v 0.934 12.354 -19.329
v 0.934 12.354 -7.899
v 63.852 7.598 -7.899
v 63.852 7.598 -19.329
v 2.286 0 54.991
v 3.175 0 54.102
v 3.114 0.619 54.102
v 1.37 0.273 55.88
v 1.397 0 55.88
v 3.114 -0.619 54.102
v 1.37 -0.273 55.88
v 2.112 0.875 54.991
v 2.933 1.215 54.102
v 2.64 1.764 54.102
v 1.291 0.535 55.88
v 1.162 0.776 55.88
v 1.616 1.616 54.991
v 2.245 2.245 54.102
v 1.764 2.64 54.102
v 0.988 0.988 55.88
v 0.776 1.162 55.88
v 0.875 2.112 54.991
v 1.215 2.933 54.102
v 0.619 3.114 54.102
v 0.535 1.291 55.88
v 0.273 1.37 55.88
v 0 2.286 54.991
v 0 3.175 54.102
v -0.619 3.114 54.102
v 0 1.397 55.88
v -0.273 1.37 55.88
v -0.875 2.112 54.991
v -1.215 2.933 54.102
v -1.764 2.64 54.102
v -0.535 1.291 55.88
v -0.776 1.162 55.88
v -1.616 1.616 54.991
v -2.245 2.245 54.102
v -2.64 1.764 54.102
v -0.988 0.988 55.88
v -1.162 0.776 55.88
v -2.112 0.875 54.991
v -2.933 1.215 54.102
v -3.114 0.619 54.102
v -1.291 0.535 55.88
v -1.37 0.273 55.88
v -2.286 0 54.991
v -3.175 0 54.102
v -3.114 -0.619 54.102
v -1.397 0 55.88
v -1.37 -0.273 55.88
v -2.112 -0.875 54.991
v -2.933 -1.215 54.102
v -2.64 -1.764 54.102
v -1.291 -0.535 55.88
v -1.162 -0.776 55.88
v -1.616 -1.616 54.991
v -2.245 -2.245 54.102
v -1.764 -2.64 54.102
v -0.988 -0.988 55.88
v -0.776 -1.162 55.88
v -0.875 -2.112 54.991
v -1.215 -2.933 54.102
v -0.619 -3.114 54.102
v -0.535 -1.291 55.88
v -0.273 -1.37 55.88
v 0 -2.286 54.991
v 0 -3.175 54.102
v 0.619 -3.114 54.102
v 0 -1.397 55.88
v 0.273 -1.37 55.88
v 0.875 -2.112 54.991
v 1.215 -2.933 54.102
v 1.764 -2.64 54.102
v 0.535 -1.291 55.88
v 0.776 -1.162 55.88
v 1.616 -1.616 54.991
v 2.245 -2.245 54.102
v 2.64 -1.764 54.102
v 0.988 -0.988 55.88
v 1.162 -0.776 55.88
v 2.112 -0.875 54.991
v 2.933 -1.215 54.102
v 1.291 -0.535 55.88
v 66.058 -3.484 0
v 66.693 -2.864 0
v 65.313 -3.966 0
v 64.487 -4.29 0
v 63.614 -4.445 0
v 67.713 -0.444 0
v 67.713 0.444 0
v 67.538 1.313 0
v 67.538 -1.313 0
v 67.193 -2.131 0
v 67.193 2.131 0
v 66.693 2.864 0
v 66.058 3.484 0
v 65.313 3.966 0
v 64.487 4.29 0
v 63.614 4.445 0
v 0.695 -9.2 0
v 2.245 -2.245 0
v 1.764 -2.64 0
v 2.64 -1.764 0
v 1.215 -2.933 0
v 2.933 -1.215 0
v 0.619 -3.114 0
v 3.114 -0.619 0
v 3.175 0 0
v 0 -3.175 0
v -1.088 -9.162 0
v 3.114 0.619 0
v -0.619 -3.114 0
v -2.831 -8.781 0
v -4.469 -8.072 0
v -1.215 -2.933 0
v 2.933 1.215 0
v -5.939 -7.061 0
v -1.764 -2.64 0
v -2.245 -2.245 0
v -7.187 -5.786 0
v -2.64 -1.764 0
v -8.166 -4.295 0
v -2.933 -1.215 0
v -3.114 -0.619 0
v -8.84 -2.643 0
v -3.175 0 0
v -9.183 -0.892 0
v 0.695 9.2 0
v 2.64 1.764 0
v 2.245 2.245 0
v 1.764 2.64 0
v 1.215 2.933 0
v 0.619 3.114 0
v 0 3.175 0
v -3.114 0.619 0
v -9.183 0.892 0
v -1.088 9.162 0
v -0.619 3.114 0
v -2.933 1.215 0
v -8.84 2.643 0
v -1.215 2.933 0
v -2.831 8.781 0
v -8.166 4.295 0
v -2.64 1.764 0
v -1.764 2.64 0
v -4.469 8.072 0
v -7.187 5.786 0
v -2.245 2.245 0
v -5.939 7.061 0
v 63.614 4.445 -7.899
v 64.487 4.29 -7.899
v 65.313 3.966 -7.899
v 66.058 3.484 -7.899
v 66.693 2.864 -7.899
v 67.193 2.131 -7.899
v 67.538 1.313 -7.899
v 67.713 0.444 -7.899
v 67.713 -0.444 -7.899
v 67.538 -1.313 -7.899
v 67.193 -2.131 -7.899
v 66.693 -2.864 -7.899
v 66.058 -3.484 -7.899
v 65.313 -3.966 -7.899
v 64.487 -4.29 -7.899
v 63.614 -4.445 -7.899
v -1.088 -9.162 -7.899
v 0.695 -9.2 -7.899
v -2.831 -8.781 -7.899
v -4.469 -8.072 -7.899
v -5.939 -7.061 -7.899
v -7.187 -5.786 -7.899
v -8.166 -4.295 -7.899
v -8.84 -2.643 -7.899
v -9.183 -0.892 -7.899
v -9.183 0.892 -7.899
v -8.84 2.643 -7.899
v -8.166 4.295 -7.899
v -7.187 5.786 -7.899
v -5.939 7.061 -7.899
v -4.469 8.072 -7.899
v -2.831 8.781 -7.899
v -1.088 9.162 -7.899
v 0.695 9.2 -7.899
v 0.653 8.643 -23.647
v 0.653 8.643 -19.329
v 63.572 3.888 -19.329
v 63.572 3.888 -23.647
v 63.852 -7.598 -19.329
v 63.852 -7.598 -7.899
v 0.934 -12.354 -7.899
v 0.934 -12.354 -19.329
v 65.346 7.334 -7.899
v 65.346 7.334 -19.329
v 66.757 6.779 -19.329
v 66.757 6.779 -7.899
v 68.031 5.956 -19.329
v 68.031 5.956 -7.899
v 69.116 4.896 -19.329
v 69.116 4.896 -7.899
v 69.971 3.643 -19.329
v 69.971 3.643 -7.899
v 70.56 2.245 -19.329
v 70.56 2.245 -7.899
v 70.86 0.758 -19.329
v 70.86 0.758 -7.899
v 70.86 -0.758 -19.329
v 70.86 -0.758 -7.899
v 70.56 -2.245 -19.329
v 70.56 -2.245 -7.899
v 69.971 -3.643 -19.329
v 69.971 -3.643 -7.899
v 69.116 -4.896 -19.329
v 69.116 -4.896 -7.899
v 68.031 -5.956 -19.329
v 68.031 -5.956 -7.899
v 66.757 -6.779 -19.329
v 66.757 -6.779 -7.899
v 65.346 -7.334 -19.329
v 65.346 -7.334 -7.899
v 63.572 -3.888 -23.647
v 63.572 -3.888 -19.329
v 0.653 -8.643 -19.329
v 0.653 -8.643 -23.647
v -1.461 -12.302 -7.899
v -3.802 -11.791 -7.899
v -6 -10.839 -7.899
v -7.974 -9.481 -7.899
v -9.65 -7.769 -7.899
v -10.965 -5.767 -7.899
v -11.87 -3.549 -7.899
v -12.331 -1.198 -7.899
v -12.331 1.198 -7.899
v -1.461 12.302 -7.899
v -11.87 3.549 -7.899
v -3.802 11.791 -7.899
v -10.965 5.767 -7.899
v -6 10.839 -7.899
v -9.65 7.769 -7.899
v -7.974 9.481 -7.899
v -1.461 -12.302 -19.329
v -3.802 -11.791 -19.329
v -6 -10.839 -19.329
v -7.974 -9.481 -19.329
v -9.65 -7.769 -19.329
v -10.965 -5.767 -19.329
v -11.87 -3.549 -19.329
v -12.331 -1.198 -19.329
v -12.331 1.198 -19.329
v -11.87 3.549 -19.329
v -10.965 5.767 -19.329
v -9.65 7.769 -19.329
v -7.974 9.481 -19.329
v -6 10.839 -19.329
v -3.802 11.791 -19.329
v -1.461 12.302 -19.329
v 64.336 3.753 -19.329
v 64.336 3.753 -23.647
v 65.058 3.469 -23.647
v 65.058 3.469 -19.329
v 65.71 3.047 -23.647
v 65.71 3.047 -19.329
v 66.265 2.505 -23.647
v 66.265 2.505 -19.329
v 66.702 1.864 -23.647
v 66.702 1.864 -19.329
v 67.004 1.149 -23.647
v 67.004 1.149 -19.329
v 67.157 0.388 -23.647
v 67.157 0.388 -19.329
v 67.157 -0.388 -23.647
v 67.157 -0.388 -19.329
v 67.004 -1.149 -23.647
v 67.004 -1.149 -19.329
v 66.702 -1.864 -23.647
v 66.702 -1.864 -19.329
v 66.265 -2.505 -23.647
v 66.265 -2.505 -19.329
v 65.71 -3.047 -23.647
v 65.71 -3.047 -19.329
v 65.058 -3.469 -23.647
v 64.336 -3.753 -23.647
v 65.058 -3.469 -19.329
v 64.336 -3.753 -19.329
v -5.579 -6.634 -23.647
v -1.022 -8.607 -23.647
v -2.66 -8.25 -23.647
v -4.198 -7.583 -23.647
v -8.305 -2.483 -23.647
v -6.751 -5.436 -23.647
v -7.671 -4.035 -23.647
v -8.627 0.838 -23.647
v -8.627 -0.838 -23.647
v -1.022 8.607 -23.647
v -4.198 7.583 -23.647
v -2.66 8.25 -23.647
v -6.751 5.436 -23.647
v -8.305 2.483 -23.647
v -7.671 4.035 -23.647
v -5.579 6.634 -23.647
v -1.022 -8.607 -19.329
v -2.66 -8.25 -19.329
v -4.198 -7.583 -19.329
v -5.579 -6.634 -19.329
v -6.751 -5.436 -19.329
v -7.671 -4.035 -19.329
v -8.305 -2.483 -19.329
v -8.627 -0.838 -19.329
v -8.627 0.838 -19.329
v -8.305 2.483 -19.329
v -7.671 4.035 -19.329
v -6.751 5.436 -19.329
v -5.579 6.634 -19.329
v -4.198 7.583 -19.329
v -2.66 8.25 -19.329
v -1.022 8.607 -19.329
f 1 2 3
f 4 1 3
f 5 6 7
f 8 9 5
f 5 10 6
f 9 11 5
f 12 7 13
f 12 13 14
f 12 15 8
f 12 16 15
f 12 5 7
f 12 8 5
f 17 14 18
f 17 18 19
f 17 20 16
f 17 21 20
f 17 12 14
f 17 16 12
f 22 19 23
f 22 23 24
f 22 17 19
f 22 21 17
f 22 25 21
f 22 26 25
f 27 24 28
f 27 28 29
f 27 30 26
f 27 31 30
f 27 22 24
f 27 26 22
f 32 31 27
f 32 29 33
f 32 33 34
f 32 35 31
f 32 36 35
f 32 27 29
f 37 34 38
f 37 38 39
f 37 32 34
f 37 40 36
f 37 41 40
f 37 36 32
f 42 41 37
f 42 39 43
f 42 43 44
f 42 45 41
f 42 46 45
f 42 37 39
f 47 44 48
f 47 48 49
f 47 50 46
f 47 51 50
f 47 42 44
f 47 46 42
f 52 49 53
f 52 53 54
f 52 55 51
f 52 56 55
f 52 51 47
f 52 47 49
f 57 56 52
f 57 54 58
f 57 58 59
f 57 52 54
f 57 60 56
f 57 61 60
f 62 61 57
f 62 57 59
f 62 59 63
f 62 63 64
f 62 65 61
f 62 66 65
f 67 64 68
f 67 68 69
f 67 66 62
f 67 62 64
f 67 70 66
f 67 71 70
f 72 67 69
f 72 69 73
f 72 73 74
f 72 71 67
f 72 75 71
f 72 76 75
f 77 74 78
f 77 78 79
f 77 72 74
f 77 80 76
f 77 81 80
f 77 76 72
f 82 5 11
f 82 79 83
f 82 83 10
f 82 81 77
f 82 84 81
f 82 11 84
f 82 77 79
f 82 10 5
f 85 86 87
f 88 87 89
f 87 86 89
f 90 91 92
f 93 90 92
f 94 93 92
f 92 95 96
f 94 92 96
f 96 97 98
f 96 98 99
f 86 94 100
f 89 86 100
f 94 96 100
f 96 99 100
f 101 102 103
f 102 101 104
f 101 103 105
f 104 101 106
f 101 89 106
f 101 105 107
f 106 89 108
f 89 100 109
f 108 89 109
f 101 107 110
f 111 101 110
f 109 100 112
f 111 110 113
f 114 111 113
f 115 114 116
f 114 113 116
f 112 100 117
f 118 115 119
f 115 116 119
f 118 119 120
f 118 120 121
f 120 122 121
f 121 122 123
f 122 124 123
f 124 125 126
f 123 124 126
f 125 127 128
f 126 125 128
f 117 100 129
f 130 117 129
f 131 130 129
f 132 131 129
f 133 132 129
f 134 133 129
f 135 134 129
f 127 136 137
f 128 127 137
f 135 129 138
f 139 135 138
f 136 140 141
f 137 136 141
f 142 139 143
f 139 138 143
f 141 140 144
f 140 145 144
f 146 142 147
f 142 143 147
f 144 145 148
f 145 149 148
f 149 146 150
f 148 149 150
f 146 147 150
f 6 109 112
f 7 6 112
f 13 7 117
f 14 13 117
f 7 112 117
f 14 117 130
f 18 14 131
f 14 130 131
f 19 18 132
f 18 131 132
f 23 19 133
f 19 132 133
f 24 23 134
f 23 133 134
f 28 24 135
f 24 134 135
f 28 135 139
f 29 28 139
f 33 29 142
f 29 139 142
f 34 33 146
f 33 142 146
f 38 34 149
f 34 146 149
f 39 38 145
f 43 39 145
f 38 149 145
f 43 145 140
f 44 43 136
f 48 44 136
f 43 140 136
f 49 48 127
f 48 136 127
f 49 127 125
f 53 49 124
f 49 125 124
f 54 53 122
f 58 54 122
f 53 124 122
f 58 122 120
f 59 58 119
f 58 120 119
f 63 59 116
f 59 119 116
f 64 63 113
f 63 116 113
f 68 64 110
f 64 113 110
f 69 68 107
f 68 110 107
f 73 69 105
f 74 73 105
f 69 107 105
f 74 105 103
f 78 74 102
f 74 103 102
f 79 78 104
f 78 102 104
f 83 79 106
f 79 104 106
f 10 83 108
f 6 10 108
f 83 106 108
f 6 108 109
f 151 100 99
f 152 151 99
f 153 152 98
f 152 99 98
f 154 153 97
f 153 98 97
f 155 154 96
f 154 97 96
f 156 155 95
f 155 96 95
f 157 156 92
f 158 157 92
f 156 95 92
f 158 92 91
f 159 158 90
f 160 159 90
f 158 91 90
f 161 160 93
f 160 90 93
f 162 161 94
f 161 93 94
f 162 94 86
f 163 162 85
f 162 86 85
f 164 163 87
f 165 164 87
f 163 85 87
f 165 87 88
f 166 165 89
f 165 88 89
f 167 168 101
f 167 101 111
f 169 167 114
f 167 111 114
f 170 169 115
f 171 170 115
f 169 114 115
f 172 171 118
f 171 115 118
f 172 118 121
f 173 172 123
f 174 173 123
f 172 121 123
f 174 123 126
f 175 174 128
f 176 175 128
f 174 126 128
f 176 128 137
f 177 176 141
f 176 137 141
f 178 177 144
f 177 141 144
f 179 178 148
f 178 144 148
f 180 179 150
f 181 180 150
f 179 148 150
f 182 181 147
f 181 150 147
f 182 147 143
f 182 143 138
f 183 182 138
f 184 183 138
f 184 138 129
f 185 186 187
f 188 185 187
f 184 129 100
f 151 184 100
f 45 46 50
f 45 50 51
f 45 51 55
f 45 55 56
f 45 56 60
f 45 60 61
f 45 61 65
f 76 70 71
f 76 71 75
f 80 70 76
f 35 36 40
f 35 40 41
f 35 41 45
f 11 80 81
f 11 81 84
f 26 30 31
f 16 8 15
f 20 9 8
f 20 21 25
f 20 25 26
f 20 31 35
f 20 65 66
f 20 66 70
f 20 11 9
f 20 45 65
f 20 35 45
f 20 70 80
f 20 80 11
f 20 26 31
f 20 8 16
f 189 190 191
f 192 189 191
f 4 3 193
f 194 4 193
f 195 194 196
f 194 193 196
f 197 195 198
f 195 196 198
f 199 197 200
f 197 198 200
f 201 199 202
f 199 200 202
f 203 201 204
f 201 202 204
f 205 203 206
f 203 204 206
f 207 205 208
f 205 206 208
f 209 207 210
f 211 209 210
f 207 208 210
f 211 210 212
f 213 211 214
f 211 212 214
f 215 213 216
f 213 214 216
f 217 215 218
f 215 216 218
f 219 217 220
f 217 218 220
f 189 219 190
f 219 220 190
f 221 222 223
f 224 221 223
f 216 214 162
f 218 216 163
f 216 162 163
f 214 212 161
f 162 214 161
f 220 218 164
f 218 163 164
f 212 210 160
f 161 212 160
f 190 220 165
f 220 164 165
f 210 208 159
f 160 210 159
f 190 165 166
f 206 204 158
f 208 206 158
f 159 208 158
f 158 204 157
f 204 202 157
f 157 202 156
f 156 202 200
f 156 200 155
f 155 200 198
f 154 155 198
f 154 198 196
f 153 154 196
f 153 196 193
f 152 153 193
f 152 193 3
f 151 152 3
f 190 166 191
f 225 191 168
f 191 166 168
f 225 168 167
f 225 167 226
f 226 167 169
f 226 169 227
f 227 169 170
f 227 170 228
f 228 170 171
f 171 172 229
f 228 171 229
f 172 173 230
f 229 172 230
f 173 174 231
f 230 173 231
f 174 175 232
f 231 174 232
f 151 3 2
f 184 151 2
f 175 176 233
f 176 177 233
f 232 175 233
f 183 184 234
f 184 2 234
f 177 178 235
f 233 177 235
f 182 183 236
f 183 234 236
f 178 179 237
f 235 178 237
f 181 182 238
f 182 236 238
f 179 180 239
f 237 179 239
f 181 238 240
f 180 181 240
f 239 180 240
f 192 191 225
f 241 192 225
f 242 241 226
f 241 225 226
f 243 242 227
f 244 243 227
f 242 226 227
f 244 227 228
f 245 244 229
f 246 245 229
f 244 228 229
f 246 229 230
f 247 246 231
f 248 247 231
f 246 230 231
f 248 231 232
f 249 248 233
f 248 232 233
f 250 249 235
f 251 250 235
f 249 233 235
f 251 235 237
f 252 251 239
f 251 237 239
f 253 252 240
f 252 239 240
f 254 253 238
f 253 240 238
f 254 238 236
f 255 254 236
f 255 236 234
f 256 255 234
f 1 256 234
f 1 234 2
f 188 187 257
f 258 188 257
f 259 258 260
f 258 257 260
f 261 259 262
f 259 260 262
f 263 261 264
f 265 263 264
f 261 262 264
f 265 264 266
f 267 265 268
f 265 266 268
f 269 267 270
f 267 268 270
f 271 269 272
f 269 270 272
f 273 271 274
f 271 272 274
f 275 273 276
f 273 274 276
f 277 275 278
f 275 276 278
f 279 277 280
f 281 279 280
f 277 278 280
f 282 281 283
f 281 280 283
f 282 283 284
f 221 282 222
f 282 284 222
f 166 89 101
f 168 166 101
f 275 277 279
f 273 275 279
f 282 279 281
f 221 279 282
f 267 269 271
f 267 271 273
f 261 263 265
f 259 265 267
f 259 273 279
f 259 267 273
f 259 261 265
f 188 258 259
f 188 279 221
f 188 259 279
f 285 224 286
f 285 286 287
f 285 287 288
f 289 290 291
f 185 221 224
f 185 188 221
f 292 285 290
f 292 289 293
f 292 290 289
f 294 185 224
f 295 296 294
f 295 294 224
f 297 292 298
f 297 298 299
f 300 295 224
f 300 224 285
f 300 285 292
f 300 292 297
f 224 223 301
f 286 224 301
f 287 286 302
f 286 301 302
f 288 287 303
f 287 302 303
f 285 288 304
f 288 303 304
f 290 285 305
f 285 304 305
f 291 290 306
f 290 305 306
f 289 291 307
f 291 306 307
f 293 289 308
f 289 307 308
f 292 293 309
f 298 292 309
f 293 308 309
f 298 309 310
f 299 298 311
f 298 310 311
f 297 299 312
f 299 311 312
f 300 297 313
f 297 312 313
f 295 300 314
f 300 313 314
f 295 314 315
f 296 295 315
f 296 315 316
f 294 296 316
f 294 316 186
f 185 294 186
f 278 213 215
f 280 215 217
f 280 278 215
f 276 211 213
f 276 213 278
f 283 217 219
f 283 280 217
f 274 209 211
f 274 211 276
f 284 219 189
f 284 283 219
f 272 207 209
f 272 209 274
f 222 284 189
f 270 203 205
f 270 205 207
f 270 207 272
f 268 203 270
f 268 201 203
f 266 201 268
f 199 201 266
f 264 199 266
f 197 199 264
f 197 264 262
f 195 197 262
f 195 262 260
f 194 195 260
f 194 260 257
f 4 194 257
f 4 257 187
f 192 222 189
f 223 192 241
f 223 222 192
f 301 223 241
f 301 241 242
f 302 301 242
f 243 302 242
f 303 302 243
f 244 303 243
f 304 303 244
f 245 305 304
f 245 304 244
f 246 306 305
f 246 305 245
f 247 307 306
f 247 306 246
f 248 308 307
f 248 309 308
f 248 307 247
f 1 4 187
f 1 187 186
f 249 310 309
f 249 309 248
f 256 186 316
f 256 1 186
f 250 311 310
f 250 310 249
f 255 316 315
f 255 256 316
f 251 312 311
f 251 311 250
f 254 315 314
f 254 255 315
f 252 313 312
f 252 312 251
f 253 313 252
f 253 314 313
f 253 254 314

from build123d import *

# Parameters (mm, degrees)
BOSS_EXTRUDE1_DEPTH = 23.6474
CUT_EXTRUDE1_START  = -15.748
CUT_EXTRUDE1_DEPTH  = 15.748
SKETCH3_R           = 3.175
BOSS_EXTRUDE2_DEPTH = 55.88
BOSS_EXTRUDE3_DEPTH = 11.43
CHAMFER1_SIZE       = 1.778


with BuildPart() as part:
    # Sketch1 → Boss-Extrude1 (new body)
    with BuildSketch(Plane.XY):
        with BuildLine():
            Line((0.695350686, 9.200310447), (63.61372159, 4.445))
            ThreePointArc((63.61372159, 4.445), (67.73545, 0), (63.61372159, -4.445))
            Line((63.61372159, -4.445), (0.695350686, -9.200310447))
            ThreePointArc((0.695350686, -9.200310447), (-9.22655, 0), (0.695350686, 9.200310447))
        make_face()
    extrude(amount=-BOSS_EXTRUDE1_DEPTH)

    # Sketch2 → Cut-Extrude1 (cut)
    with BuildSketch(Plane(origin=(0, 0, -23.6474), x_dir=(-1, 0, 0), z_dir=(0, 0, -1)).offset(CUT_EXTRUDE1_START)):
        with BuildLine():
            Line((-0.695350686, 9.200310447), (-63.61372159, 4.445))
            ThreePointArc((-63.61372159, 4.445), (-67.73545, 0), (-63.61372159, -4.445))
            Line((-63.61372159, -4.445), (-0.695350686, -9.200310447))
            ThreePointArc((-0.695350686, -9.200310447), (9.22655, 0), (-0.695350686, 9.200310447))
        make_face()
        with BuildLine():
            Line((-0.653237224, 8.643099629), (-63.571608128, 3.887789181))
            ThreePointArc((-63.571608128, 3.887789181), (-67.17665, 0), (-63.571608128, -3.887789181))
            Line((-63.571608128, -3.887789181), (-0.653237224, -8.643099629))
            ThreePointArc((-0.653237224, -8.643099629), (8.66775, 0), (-0.653237224, 8.643099629))
        make_face(mode=Mode.SUBTRACT)
    extrude(amount=CUT_EXTRUDE1_DEPTH, mode=Mode.SUBTRACT)

    # Sketch3 → Boss-Extrude2 (add)
    with BuildSketch(Plane.XY):
        Circle(SKETCH3_R)
    extrude(amount=BOSS_EXTRUDE2_DEPTH)

    # Sketch4 → Boss-Extrude3 (add)
    with BuildSketch(Plane(origin=(0, 0, -7.8994), x_dir=(-1, 0, 0), z_dir=(0, 0, -1))):
        with BuildLine():
            Line((-0.933674597, 12.353617125), (-63.852045501, 7.598306678))
            ThreePointArc((-63.852045501, 7.598306678), (-70.89775, 0), (-63.852045501, -7.598306678))
            Line((-63.852045501, -7.598306678), (-0.933674597, -12.353617125))
            ThreePointArc((-0.933674597, -12.353617125), (12.38885, 0), (-0.933674597, 12.353617125))
        make_face()
        with BuildLine():
            Line((-0.653237224, 8.643099629), (-63.571608128, 3.887789181))
            ThreePointArc((-63.571608128, 3.887789181), (-67.17665, 0), (-63.571608128, -3.887789181))
            Line((-63.571608128, -3.887789181), (-0.653237224, -8.643099629))
            ThreePointArc((-0.653237224, -8.643099629), (8.66775, 0), (-0.653237224, 8.643099629))
        make_face(mode=Mode.SUBTRACT)
    extrude(amount=BOSS_EXTRUDE3_DEPTH)

    # Chamfer1
    chamfer1_edges = [part.edges().sort_by_distance(p)[0] for p in [
        (-3.175, 0, 55.88),
    ]]
    chamfer(chamfer1_edges, length=CHAMFER1_SIZE)


solid = part.part
